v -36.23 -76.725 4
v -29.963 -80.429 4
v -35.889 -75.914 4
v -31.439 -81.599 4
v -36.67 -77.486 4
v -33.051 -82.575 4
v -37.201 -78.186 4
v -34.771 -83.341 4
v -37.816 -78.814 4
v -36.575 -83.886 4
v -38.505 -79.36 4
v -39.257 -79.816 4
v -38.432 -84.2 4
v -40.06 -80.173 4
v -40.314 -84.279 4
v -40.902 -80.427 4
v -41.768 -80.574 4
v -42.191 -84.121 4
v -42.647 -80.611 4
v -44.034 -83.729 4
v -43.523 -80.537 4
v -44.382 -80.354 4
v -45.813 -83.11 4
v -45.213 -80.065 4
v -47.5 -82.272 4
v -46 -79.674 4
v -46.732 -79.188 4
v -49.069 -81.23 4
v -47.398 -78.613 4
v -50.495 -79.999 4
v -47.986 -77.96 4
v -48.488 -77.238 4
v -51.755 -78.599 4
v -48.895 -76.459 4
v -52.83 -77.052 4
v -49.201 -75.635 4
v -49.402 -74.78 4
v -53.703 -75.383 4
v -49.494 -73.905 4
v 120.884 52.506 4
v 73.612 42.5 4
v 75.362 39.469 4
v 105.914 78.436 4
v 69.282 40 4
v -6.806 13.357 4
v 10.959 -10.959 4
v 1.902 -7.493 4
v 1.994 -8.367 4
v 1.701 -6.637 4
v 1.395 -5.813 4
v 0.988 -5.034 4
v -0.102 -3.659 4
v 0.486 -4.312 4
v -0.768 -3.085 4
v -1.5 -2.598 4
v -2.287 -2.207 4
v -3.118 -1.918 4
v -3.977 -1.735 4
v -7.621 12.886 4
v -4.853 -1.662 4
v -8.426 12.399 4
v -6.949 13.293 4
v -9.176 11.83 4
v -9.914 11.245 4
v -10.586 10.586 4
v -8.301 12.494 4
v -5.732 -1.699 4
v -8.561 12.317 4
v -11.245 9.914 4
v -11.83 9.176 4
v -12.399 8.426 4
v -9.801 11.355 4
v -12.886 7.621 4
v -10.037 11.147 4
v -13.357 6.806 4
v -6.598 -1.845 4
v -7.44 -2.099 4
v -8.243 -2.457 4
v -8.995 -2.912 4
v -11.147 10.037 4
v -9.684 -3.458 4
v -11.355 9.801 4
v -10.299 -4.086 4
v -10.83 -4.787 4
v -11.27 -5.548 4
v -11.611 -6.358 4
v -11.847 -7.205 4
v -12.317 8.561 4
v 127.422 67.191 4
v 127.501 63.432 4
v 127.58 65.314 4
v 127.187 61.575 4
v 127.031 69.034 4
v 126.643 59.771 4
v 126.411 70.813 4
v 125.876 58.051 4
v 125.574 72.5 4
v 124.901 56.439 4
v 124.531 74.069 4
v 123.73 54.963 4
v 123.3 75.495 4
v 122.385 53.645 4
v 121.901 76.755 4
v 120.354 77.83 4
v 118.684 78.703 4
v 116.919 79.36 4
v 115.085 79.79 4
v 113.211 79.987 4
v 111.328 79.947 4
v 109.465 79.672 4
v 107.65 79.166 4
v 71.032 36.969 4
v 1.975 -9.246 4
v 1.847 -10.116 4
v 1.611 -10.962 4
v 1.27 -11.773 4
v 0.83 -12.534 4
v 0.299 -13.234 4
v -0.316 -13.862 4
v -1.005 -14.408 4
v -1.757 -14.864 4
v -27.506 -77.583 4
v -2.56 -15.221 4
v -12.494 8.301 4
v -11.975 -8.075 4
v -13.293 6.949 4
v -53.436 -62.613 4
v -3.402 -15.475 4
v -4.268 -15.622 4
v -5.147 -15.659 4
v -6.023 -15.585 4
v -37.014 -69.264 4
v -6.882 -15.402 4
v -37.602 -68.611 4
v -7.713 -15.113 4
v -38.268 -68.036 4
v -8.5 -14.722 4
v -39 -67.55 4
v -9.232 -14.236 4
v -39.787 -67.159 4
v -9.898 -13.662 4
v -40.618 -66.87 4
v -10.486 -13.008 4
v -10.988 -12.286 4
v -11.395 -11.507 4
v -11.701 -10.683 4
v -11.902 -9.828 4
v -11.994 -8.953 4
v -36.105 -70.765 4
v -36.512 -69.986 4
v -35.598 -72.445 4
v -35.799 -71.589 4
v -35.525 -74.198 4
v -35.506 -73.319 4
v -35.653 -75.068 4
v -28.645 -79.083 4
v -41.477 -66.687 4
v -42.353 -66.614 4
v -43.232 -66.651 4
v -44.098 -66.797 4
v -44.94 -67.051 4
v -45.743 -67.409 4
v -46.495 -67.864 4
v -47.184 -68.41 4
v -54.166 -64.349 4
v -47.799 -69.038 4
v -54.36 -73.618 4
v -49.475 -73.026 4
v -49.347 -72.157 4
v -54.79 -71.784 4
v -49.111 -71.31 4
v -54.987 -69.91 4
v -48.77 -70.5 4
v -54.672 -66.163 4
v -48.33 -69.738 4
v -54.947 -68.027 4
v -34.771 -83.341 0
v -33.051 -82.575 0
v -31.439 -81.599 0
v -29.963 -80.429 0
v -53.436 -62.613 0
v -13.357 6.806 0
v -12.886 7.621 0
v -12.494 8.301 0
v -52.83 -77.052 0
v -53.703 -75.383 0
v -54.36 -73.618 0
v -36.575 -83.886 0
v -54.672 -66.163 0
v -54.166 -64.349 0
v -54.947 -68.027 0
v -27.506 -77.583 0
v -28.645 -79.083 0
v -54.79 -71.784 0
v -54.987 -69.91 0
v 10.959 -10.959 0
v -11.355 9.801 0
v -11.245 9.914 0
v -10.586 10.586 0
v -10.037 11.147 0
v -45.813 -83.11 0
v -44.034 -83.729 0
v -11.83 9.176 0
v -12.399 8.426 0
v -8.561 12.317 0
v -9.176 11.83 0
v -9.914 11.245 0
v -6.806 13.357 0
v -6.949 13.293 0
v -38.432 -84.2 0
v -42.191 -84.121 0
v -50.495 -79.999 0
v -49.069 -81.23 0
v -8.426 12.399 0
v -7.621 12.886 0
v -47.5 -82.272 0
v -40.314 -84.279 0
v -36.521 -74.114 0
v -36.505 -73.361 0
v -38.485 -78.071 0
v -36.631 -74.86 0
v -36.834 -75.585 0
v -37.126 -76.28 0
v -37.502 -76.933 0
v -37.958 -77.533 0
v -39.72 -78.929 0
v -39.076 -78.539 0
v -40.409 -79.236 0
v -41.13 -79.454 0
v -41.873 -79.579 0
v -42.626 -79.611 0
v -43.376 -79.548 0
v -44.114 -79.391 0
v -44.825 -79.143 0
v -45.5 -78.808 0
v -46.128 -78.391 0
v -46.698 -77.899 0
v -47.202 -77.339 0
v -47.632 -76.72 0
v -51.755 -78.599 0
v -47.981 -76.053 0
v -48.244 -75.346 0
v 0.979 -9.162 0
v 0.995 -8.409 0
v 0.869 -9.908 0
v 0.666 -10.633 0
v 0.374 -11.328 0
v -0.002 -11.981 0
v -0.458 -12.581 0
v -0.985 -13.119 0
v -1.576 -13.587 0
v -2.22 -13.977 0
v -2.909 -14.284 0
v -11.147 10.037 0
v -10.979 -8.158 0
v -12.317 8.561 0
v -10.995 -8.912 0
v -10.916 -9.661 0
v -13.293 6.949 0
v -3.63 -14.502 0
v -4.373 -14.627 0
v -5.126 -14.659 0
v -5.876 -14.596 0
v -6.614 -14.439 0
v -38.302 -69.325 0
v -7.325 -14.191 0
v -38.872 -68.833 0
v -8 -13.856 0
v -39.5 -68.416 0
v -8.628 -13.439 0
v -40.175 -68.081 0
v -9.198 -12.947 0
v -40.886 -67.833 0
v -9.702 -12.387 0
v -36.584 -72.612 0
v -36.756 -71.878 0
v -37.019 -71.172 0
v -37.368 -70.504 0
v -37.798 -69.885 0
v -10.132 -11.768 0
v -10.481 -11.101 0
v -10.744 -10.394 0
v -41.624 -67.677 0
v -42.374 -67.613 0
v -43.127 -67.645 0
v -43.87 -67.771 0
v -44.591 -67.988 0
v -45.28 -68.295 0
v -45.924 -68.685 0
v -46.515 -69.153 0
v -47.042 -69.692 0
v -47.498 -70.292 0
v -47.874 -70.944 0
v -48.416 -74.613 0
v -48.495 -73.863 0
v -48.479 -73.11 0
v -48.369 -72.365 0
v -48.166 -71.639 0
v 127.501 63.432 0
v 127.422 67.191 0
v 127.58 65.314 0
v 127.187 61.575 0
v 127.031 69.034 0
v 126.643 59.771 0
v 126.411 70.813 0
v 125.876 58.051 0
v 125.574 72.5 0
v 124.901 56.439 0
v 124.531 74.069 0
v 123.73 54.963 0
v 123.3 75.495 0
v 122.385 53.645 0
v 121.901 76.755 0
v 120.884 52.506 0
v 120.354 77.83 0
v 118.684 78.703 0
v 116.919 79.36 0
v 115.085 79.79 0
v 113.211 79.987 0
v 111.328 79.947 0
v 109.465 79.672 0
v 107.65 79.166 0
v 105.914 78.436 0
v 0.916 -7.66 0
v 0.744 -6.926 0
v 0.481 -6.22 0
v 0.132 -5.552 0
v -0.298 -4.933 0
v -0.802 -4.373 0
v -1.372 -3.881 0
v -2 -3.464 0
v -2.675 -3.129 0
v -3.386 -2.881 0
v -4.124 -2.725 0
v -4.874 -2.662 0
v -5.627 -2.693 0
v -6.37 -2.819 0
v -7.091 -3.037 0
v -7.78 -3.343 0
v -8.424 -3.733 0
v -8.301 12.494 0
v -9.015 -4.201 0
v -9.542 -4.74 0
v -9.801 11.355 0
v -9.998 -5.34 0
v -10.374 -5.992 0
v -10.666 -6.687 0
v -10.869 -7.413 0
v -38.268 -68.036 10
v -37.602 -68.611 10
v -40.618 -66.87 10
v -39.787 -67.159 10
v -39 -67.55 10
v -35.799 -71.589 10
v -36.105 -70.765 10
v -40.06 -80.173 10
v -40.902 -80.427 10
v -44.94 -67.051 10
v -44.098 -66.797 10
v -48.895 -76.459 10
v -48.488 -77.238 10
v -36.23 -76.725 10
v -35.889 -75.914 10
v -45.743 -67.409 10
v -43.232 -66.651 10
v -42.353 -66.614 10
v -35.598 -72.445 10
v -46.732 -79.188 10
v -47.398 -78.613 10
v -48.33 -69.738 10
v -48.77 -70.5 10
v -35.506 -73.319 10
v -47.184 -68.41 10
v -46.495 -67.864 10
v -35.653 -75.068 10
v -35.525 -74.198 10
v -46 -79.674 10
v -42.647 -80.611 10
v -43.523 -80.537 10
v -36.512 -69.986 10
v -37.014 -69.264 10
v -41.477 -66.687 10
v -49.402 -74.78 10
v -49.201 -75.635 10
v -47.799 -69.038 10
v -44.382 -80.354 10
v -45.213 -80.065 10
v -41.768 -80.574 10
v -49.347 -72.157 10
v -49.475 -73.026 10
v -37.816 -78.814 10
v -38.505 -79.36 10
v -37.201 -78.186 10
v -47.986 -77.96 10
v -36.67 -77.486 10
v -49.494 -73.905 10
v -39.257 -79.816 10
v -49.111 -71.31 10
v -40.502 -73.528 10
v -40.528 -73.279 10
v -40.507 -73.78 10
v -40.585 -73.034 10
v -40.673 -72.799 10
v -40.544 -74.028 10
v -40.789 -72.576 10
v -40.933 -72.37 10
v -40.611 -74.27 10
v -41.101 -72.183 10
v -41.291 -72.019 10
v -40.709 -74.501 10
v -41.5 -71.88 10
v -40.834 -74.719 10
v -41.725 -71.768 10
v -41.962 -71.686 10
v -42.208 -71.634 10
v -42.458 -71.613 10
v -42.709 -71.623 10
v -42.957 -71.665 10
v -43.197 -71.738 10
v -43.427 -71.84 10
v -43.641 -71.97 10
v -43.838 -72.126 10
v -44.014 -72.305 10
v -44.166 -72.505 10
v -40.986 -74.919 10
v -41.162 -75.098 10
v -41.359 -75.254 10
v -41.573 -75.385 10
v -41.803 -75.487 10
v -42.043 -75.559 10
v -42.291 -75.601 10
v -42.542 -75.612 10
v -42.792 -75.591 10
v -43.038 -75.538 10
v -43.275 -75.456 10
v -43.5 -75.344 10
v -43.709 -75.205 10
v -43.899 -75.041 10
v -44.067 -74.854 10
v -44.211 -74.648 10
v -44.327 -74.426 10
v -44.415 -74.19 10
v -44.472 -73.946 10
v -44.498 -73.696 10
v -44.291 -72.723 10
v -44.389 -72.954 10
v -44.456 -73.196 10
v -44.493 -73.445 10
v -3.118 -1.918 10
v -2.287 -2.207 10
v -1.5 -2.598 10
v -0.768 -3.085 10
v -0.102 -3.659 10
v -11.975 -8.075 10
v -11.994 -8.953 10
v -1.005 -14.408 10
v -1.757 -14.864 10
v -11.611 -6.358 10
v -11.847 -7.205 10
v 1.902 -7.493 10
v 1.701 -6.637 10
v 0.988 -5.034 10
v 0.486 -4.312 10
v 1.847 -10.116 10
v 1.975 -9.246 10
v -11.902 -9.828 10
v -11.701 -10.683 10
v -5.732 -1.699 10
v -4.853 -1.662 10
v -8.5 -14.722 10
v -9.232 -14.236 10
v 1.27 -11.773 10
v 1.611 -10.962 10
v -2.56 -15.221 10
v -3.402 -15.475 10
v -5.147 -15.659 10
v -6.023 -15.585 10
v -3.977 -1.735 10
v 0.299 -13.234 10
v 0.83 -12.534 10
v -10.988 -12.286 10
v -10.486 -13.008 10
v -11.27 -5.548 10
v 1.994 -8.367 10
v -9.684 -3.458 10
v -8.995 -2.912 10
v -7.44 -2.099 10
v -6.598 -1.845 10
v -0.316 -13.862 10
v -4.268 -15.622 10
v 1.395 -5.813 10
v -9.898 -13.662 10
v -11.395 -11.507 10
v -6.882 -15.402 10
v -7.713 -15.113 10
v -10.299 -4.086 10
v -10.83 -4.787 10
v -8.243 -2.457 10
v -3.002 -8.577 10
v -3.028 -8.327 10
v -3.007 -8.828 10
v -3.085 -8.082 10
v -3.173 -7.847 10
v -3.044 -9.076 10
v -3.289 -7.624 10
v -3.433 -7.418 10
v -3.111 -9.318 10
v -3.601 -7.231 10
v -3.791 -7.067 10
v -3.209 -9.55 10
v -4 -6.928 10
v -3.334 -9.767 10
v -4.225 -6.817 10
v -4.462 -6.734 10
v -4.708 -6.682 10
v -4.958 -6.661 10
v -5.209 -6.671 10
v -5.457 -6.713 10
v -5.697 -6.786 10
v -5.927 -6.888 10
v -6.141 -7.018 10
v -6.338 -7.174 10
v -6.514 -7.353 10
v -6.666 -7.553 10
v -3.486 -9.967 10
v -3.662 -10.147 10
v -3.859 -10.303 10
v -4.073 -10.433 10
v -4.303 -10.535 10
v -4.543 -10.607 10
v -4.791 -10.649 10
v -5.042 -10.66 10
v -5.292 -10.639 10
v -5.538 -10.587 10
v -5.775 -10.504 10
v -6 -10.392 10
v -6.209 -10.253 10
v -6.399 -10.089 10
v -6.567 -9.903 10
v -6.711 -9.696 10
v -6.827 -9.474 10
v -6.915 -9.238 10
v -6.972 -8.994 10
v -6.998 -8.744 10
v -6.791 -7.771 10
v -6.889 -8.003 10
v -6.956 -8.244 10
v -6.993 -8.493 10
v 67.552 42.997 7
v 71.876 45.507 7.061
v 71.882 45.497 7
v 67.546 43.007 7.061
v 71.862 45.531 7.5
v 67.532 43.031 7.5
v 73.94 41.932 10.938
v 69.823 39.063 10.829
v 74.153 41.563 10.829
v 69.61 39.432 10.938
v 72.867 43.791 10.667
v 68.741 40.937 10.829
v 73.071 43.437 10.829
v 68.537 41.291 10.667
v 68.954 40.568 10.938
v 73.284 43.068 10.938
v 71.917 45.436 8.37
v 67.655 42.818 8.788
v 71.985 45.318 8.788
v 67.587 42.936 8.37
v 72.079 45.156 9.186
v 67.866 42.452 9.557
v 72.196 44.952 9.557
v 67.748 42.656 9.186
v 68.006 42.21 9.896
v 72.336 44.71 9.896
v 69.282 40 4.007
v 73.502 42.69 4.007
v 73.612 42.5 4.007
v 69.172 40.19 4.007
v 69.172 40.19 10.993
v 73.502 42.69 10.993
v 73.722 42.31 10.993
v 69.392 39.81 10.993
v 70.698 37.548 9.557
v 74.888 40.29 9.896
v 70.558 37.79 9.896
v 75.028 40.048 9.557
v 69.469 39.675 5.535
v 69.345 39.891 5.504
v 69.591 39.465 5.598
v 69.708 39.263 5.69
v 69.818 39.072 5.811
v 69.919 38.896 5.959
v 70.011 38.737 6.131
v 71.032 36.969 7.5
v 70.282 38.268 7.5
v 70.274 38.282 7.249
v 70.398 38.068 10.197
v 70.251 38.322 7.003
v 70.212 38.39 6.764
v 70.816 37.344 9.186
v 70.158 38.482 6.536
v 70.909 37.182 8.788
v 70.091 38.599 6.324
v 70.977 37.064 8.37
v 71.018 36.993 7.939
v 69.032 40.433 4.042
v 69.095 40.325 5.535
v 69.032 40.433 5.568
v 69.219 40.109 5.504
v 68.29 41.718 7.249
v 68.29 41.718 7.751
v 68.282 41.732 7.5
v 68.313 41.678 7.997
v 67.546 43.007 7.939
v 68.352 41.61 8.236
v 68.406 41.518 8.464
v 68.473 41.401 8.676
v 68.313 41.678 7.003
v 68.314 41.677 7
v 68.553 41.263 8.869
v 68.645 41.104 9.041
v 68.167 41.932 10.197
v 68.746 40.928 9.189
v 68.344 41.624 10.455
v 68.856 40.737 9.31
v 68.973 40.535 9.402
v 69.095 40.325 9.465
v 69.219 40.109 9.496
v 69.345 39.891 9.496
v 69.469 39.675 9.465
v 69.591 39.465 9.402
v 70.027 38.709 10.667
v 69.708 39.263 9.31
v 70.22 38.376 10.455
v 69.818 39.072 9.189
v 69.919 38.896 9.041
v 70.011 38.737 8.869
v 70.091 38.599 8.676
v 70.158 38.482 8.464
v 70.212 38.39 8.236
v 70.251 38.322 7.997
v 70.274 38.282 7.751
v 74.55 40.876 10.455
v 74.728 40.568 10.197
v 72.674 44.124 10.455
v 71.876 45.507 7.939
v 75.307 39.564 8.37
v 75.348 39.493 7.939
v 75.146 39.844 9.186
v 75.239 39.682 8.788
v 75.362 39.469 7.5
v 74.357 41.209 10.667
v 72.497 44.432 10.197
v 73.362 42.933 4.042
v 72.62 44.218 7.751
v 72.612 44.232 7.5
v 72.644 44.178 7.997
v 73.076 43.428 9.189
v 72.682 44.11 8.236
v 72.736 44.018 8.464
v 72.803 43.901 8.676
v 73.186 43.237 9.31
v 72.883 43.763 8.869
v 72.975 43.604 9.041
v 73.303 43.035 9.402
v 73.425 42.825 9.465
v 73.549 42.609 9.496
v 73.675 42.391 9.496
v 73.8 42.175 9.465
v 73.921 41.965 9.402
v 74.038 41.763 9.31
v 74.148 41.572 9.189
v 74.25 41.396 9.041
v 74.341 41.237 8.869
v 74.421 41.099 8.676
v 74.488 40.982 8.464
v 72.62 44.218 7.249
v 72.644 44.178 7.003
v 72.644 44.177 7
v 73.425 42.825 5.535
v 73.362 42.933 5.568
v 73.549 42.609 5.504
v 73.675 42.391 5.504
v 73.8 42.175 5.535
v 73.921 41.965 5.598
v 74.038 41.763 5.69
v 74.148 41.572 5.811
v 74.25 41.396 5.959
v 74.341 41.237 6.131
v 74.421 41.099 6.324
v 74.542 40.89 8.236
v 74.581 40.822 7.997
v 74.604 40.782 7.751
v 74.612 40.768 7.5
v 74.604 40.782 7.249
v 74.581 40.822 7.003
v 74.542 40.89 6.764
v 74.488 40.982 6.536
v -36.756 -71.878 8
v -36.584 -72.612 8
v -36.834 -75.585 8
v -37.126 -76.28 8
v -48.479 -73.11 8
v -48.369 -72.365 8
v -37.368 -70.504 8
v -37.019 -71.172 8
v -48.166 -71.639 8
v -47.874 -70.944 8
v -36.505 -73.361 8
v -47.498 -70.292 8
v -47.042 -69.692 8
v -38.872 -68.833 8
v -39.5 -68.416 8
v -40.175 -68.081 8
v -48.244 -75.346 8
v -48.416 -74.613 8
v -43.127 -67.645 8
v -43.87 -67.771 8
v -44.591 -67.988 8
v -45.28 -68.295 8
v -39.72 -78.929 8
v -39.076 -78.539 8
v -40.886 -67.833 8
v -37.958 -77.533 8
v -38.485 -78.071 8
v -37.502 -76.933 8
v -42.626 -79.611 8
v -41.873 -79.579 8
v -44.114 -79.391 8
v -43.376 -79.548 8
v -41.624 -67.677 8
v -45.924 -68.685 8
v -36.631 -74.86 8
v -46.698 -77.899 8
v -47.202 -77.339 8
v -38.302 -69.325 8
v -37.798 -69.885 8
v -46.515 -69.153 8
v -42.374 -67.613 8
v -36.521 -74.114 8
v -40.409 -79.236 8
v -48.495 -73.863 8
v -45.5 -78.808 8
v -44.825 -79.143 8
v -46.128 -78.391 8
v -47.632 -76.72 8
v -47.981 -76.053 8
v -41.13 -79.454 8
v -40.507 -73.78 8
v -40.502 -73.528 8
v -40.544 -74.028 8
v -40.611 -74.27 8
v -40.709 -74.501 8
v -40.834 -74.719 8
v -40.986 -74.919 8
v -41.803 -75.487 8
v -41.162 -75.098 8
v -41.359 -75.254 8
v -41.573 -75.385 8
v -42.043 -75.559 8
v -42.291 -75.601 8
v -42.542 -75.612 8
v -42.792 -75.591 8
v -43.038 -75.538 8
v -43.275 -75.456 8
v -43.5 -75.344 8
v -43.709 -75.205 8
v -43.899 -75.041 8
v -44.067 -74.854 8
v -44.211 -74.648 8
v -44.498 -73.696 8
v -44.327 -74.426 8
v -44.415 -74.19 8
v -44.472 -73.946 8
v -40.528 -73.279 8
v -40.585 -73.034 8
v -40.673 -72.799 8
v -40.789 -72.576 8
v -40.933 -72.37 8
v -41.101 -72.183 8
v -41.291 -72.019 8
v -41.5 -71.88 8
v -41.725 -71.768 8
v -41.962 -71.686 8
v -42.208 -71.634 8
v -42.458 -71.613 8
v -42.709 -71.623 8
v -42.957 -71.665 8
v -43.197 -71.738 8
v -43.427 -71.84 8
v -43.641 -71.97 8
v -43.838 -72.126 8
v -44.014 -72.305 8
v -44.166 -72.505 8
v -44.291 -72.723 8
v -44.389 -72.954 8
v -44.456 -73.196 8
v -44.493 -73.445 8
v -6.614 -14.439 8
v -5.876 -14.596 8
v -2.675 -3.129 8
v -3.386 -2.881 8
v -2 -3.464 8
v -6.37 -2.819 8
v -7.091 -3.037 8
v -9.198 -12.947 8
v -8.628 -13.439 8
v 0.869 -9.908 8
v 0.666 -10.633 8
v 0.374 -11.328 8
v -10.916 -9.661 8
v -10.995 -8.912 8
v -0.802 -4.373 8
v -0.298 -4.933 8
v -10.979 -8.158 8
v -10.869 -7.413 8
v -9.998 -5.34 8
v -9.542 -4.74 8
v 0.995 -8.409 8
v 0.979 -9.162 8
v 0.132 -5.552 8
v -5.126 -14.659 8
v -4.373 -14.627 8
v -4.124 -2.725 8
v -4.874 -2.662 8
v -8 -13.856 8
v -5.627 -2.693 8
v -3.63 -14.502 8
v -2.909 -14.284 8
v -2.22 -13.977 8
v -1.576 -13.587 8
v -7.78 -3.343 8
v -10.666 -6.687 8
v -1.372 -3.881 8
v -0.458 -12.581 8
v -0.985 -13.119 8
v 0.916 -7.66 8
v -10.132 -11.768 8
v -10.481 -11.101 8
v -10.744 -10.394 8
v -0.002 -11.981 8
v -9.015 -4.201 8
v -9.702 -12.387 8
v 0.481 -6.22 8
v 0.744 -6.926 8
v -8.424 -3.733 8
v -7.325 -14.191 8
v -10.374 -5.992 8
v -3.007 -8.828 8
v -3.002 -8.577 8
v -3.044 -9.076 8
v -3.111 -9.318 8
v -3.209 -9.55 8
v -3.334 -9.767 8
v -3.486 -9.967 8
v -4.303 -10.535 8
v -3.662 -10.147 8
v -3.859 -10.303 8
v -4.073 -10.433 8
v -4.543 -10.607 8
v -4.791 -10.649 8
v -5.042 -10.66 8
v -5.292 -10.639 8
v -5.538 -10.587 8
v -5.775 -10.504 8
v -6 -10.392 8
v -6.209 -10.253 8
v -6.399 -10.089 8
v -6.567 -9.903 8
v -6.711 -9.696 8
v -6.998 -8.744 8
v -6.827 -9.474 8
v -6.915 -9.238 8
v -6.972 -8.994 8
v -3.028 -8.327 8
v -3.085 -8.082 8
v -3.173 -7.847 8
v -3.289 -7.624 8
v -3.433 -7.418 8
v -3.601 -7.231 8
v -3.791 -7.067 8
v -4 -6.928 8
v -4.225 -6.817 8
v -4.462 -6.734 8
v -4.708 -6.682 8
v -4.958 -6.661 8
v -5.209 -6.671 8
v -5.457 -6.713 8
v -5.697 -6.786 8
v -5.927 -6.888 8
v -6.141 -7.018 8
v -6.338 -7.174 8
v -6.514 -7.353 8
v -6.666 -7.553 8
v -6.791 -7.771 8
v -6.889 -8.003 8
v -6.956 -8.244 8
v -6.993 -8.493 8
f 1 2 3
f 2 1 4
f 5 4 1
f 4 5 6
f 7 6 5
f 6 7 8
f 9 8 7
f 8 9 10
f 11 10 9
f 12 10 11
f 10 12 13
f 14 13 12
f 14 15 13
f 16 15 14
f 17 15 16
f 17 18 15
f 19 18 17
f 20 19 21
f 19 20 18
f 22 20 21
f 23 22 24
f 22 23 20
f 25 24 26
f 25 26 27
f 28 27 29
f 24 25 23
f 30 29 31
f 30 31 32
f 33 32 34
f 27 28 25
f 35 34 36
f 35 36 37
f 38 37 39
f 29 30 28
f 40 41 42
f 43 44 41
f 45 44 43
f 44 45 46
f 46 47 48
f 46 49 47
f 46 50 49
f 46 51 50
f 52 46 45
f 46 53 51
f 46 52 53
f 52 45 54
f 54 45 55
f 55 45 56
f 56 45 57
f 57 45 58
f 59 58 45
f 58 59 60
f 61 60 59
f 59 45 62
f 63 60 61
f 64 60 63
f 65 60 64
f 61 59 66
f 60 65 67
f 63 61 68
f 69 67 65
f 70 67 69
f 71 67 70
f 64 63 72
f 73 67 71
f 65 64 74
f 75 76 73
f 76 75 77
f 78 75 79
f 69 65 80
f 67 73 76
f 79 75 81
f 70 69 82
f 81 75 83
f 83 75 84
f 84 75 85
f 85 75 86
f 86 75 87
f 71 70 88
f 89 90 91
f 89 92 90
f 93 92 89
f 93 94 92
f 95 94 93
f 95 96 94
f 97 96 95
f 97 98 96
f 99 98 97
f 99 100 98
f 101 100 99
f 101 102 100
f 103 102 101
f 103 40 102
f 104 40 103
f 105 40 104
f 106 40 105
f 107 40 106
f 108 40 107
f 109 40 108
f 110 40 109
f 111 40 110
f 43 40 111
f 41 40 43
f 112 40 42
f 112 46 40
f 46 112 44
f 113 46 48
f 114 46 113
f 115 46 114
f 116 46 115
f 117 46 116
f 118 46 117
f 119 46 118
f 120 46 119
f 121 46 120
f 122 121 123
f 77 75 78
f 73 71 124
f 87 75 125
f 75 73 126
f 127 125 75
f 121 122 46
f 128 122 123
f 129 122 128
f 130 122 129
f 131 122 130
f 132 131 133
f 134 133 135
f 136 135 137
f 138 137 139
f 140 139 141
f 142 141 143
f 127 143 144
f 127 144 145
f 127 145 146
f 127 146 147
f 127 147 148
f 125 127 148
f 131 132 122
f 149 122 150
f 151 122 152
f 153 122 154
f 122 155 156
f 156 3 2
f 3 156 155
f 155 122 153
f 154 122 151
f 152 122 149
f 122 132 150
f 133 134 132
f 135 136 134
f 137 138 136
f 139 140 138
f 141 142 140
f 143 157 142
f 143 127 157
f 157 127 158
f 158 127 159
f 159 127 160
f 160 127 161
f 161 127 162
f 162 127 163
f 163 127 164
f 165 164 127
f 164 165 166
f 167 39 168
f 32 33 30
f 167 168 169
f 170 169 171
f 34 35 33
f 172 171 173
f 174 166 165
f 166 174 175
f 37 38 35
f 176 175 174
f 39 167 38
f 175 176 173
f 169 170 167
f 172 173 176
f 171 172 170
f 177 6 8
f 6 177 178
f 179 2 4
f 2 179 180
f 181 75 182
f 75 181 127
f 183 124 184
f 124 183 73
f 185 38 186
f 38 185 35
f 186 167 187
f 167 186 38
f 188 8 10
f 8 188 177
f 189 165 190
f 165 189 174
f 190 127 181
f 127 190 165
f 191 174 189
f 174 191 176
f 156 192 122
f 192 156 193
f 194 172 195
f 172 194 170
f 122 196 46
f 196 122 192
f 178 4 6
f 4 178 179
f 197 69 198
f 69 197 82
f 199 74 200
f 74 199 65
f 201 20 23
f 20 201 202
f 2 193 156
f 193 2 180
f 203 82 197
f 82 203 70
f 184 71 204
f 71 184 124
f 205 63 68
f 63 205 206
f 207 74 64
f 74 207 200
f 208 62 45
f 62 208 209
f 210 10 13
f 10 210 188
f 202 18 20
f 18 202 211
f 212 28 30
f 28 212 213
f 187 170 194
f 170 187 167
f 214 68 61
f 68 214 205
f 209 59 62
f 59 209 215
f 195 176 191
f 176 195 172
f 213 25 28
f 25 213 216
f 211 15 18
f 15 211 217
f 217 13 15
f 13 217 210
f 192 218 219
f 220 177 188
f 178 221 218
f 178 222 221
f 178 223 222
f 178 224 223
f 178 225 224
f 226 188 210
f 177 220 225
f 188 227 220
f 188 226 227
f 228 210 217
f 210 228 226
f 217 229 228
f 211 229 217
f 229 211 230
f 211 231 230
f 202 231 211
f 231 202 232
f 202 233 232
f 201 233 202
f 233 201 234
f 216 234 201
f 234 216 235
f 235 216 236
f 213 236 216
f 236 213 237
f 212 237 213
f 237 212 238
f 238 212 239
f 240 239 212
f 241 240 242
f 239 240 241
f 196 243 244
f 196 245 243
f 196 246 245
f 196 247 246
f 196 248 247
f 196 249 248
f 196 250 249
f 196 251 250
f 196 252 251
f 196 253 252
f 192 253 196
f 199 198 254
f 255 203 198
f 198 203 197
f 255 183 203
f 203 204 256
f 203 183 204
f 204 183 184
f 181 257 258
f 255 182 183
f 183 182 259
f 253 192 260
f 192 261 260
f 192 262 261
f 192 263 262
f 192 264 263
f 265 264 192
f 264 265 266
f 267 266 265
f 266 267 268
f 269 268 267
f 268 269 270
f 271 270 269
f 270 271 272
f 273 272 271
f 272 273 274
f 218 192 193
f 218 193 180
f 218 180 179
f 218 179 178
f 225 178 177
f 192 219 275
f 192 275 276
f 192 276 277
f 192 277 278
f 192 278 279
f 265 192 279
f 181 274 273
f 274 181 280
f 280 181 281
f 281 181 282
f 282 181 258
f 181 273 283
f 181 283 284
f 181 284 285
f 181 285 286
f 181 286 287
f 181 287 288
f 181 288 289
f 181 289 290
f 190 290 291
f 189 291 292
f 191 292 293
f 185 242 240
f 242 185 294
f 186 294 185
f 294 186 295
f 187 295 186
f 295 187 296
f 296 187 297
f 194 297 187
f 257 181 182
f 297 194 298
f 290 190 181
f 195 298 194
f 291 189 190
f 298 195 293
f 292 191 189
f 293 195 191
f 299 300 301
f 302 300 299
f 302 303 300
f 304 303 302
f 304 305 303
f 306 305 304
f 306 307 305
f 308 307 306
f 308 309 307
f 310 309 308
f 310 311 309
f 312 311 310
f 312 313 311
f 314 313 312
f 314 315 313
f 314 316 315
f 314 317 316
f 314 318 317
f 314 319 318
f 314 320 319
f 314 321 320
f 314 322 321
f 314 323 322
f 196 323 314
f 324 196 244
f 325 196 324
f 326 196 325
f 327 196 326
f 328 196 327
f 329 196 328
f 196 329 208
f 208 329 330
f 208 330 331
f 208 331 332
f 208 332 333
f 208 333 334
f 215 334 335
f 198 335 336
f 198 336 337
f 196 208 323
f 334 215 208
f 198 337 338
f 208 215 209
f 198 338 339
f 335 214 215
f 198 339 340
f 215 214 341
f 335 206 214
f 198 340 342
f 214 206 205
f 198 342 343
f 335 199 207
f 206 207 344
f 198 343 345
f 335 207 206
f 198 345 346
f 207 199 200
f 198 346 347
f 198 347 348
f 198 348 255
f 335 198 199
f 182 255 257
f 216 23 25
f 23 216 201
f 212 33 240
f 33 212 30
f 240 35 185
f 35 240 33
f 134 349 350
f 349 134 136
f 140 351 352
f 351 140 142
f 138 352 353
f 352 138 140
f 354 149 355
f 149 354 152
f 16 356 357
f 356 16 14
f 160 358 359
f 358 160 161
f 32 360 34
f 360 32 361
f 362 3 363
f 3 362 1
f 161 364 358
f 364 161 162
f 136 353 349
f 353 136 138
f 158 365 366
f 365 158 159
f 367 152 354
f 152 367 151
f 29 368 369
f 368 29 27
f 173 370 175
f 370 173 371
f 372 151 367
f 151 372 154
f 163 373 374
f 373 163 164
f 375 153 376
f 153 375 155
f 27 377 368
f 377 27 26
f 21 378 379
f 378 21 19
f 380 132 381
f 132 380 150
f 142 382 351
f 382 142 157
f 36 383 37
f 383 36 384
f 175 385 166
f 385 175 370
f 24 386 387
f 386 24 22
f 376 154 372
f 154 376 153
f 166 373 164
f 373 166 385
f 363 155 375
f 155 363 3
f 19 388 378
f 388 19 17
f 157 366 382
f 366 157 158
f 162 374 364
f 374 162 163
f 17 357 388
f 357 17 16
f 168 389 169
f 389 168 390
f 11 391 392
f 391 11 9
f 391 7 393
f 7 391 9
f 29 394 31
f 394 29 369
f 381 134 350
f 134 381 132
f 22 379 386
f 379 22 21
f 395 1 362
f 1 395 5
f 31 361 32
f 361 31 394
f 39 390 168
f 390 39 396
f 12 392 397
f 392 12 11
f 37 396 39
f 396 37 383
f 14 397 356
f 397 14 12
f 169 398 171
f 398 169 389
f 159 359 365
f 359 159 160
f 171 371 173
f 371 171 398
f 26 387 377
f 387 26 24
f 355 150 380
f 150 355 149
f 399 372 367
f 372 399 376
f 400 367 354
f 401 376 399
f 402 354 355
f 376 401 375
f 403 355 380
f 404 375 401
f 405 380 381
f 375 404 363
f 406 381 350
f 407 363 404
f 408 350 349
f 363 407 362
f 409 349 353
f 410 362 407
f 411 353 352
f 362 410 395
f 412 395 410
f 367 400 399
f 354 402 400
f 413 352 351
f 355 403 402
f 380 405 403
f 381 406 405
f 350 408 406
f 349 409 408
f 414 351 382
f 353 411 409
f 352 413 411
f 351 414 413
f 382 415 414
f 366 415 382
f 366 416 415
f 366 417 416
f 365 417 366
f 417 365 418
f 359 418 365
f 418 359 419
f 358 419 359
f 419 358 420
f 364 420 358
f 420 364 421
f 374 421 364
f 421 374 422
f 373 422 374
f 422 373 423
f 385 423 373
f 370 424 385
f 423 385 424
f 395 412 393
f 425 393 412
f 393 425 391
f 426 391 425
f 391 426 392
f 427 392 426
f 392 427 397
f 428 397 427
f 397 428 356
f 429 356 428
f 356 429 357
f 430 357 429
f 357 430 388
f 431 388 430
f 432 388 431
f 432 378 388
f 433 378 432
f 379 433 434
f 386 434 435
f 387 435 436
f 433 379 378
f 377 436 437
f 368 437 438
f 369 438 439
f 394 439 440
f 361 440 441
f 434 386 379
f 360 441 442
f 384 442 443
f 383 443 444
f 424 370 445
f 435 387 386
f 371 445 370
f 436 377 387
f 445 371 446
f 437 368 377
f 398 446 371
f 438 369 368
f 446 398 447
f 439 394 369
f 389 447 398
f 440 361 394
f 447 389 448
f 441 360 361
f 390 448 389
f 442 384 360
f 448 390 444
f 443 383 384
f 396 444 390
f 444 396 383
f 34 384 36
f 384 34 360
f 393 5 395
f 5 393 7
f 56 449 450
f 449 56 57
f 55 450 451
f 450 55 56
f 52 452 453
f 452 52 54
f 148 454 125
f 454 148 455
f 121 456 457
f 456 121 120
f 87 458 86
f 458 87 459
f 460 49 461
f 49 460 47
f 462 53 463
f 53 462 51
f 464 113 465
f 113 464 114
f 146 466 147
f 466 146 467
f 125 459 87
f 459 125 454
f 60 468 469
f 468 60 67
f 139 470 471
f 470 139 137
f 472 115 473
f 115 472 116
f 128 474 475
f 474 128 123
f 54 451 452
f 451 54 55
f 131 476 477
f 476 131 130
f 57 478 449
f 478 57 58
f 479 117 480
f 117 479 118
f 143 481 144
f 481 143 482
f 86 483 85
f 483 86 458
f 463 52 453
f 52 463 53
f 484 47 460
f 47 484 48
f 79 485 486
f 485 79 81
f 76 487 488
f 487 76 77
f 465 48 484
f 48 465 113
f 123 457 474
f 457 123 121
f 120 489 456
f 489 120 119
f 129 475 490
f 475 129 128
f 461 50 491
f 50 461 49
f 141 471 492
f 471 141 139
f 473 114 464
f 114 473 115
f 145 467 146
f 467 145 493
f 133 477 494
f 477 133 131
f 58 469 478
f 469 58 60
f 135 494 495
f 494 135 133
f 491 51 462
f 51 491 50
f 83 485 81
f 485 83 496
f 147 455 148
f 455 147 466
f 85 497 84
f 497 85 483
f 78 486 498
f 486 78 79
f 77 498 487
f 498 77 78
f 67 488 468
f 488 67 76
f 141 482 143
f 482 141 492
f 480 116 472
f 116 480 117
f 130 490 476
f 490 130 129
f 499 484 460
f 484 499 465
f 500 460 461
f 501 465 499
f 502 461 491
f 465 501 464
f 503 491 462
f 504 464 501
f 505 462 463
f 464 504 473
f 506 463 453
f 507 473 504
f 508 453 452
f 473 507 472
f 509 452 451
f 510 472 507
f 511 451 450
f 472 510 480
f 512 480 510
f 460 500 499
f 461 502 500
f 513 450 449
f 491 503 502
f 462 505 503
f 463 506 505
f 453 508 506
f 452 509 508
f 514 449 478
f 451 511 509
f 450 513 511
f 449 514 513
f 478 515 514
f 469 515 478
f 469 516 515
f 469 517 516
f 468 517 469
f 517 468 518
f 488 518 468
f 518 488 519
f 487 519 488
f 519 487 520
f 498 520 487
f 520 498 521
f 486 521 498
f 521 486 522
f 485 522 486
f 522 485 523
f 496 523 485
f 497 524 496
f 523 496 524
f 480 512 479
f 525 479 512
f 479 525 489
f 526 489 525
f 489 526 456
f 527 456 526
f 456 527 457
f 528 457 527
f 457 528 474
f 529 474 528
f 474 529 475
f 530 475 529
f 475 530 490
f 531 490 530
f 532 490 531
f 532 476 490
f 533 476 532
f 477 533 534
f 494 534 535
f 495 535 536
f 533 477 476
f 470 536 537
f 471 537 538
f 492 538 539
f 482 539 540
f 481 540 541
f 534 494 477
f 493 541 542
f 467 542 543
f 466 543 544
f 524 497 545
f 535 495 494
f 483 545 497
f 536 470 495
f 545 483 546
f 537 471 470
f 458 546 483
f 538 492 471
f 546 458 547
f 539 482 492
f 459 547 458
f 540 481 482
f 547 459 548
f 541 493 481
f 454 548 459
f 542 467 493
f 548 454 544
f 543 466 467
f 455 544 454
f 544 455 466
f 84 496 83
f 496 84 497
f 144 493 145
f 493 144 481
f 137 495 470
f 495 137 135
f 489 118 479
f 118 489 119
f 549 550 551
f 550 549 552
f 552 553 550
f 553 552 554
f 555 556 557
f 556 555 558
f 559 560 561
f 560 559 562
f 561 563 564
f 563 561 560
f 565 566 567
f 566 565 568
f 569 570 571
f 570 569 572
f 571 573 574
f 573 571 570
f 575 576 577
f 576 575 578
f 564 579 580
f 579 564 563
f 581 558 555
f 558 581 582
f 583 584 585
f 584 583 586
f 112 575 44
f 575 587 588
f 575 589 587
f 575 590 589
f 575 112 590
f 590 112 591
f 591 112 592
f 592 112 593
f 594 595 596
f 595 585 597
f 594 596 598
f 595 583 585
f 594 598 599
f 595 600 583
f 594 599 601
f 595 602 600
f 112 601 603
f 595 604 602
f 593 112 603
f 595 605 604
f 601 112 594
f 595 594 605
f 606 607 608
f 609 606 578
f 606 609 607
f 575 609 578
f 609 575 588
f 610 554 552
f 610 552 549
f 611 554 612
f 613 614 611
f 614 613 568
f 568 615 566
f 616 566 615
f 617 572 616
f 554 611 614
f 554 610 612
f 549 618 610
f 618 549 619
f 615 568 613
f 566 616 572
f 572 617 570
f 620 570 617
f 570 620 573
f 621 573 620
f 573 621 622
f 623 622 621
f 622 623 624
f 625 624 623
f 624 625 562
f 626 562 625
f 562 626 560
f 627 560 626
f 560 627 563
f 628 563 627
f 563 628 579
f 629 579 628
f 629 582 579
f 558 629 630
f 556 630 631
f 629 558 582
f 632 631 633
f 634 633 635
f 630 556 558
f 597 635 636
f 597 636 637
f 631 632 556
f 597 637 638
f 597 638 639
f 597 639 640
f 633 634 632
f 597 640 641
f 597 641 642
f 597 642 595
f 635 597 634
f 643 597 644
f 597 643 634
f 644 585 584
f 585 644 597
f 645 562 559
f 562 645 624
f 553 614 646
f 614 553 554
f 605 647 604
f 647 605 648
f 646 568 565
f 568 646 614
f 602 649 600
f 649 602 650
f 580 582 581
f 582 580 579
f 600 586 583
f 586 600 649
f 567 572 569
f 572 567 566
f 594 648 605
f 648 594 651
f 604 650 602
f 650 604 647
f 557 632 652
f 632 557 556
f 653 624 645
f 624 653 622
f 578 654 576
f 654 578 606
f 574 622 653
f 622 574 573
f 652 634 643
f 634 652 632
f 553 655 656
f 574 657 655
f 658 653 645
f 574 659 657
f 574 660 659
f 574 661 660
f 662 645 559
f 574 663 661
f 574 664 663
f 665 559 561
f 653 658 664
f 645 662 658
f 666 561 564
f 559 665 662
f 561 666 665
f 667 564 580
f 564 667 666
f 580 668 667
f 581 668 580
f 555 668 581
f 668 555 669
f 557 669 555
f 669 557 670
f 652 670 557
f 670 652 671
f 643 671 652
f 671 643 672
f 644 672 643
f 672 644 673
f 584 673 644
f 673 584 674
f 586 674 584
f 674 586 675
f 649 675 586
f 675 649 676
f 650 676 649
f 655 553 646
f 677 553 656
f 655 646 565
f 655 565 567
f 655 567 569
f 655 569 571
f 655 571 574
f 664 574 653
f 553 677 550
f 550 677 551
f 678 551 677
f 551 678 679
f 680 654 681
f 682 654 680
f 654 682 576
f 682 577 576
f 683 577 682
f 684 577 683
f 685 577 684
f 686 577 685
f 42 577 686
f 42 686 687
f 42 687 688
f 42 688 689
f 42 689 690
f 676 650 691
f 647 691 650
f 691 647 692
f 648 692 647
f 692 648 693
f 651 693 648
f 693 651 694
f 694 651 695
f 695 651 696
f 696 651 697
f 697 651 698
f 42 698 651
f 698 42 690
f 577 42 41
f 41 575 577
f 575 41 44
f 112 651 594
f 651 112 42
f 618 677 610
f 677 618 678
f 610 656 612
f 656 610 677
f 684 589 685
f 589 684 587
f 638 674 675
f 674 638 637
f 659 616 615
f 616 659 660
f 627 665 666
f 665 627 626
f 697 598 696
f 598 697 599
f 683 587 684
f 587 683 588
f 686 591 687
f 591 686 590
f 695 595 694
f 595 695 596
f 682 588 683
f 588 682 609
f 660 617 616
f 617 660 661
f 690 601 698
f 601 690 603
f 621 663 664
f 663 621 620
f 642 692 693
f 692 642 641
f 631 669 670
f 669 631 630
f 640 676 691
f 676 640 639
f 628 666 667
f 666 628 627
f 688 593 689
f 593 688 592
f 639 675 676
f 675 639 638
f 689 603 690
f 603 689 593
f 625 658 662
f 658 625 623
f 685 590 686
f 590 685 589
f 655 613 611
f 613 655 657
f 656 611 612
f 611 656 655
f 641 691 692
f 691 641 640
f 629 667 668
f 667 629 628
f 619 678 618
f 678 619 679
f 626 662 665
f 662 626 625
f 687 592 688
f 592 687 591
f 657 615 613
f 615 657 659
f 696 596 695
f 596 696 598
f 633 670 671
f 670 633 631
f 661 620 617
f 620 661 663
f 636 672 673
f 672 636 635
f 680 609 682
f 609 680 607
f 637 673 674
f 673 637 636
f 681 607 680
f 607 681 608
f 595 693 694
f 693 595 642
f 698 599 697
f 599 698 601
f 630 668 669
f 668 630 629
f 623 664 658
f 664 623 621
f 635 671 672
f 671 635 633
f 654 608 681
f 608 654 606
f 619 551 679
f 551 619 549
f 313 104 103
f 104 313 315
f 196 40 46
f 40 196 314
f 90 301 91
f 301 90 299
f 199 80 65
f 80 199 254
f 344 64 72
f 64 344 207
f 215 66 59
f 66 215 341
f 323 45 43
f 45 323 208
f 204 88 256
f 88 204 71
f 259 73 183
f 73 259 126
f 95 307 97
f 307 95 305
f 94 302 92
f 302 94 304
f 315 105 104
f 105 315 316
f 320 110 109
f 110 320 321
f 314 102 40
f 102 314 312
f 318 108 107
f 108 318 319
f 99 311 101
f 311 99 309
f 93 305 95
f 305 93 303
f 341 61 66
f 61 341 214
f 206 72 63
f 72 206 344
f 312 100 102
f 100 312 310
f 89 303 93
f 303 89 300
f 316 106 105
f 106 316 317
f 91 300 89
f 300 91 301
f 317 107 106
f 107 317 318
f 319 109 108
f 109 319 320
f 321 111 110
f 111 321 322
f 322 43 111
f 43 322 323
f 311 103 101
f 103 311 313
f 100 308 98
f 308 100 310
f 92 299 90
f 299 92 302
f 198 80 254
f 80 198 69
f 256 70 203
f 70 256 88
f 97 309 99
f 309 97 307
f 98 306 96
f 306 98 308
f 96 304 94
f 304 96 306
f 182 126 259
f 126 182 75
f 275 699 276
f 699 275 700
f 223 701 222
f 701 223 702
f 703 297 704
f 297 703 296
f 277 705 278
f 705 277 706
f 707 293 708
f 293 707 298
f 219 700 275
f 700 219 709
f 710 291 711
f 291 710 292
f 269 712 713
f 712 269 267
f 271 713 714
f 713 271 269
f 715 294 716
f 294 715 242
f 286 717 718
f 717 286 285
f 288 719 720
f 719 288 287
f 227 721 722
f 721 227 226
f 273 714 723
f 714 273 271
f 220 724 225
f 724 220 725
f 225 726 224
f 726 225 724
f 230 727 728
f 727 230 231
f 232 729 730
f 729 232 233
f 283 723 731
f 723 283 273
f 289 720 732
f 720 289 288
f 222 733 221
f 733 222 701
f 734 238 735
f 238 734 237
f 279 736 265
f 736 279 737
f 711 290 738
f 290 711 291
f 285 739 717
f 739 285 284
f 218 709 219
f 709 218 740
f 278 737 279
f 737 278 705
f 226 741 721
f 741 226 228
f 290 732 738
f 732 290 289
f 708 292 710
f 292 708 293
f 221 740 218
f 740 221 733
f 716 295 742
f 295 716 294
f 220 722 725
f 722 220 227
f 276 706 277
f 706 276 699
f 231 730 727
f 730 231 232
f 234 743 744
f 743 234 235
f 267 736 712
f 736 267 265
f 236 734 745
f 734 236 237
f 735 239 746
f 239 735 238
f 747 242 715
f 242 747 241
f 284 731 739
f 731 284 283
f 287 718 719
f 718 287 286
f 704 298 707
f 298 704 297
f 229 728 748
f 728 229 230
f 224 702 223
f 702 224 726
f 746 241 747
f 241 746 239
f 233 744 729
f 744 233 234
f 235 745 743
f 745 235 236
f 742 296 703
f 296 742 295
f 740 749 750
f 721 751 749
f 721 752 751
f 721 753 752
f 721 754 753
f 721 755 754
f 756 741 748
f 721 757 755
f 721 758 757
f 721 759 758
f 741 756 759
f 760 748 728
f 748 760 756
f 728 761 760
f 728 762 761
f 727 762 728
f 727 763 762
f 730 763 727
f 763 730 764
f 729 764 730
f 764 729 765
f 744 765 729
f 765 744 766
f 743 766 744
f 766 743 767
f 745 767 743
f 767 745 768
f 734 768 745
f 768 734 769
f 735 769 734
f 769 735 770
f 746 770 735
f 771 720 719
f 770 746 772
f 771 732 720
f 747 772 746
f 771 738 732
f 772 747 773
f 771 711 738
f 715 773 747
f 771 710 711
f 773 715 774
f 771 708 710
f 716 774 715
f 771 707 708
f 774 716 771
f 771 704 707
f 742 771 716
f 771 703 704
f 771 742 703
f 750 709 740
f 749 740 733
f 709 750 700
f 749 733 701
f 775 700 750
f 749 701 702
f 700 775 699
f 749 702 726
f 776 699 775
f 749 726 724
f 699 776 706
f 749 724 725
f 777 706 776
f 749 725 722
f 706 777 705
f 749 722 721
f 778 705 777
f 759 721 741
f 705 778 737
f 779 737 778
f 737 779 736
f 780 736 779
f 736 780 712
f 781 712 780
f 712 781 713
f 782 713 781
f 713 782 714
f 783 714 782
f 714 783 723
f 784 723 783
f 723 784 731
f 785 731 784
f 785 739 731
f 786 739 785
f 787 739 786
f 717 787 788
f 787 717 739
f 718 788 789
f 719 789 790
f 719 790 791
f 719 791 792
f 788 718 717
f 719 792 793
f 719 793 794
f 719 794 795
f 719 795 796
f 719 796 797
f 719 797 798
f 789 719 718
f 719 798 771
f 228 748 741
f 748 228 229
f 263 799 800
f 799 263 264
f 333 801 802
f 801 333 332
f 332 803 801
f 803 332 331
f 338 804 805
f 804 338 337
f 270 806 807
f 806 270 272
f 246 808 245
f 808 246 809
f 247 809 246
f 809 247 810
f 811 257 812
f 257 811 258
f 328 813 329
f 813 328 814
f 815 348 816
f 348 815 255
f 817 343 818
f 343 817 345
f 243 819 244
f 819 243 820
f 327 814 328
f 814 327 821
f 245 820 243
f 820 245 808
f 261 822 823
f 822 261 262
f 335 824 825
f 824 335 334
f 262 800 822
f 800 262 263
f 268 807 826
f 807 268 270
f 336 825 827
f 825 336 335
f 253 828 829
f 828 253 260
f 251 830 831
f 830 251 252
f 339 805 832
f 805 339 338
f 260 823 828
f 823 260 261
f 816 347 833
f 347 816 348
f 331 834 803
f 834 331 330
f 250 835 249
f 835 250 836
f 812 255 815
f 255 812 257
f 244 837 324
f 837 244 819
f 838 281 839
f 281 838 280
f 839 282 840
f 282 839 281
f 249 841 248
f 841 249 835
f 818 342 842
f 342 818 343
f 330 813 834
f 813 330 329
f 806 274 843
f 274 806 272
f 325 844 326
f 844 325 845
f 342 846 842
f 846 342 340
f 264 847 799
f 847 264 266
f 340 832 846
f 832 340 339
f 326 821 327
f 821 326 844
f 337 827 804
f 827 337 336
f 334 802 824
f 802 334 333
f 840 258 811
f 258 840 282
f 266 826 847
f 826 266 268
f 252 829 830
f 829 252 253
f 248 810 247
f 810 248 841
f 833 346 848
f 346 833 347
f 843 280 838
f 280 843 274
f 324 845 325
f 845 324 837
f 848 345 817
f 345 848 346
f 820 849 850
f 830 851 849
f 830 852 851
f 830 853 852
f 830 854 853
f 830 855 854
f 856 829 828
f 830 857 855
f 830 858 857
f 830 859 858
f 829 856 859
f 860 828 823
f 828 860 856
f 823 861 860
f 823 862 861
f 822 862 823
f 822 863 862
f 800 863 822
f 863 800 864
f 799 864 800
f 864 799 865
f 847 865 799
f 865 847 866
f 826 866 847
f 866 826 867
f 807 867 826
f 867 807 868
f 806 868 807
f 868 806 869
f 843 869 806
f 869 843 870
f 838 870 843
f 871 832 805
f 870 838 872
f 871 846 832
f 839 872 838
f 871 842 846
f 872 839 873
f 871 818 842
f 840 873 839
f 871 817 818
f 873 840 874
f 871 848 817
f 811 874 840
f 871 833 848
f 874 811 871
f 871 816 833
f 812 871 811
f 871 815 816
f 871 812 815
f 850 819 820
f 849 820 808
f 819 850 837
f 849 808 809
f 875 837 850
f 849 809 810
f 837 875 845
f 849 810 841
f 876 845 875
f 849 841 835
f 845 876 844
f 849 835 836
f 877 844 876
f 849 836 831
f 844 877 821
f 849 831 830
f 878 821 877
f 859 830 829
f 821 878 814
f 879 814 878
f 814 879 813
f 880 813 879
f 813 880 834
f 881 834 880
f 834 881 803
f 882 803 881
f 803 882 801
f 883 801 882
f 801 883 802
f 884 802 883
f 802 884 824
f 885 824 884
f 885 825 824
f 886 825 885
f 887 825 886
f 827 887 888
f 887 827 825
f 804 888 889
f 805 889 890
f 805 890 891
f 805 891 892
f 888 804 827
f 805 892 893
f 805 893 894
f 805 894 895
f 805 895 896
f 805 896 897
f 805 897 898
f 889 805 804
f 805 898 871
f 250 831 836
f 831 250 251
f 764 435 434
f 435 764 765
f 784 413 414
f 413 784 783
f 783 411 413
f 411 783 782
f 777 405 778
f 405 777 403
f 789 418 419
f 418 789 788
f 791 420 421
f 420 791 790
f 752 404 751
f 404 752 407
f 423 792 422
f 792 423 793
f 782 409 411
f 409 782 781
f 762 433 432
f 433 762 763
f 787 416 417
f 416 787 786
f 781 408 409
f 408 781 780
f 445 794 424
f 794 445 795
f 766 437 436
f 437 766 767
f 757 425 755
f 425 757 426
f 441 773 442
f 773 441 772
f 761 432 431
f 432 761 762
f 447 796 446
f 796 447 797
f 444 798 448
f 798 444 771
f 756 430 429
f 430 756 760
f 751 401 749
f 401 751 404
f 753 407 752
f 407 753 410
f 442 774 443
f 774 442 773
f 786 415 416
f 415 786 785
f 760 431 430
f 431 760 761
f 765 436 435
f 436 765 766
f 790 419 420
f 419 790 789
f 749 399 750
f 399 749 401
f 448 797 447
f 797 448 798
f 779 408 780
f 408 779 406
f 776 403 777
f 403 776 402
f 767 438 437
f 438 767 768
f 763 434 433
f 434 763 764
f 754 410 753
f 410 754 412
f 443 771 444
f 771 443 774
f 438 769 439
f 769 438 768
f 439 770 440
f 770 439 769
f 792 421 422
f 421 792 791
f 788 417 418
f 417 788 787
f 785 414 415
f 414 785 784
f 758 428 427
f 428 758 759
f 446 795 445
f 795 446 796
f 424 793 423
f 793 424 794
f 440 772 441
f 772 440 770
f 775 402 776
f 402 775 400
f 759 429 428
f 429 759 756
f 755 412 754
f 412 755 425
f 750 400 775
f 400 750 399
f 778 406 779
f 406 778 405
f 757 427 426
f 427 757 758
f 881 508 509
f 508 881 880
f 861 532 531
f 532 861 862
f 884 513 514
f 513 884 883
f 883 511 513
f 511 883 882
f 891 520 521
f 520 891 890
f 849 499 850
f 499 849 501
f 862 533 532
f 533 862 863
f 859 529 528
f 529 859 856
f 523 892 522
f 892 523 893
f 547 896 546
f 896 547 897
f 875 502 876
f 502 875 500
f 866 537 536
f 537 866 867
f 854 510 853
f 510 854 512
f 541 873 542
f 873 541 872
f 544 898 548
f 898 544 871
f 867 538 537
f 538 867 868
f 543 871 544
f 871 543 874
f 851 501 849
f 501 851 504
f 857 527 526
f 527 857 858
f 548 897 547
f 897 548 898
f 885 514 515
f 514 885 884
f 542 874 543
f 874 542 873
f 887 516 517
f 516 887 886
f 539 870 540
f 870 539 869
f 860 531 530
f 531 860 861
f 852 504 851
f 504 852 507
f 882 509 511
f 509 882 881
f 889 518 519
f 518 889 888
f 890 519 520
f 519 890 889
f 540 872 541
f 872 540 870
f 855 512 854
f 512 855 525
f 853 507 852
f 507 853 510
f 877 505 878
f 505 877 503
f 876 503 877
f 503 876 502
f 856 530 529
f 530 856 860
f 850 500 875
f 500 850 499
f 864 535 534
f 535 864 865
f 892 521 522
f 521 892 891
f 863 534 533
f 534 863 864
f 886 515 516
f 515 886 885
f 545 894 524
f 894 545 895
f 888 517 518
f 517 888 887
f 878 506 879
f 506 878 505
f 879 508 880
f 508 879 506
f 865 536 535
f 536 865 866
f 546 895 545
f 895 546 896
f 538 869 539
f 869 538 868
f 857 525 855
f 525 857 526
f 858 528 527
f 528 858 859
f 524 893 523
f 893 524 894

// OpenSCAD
/* [Support] */
// Length of the mount arm. Longer arms will produce more vibrations.
armLenght = 145; // [120:170]

// Mount direction
mountDir = 1; // [1:To the right, -1:To the left]
// Angle between arms. Best suit for me was 30º
armsAngle = 30; // [0:90]

// Include cable holder
cableHolder = 1; // [0:No, 1:Yes]

// Cable diameter
cableDiameter = 4; // [1:10]

// Separation between cable holder and mount support
holderSeparation = 60; //[10:150]

/* [Hidden] */
width=30;
height=4;
corner=10;
len1=armLenght;
len2=95;


rad1=6;
rad2=7;
rad3=2;
h1=6;
h2=2;

// Separation between drills
dist1=75;

// Distance to end from mount base
dist2=10;
dist3=holderSeparation;
$fn=50;

ang=armsAngle*mountDir;

cR=1.5;
cabRad=cableDiameter/2;
cabLen=5;



rotate(a=[0, 0, (mountDir == 1 ? 0 : 180) + mountDir*30]) carMount();

module carMount() {
difference() {
union() {
sideA();
//translate([len1-dist2, 0, height]) mount();
rotate(a=[0, 0, ang]) translate([-len2+width/2, 0, 0]) sideB();
    if (cableHolder==1) translate([len1-dist3, 0, height]) cableHolder();
}
rotate(a=[0, 0, ang]) translate([-len2+width/2, 0, 0]) drills();
}
}

module cableHolder() {
    translate([0, 0, cabRad+cR]) rotate(a=[90, -180, -mountDir*90])
    difference() {
        union() {
    cylinder(r=cabRad+cR, h=cabLen);
    translate([-cabRad-cR, 0, 0]) cube([cabRad+cR, cabRad+cR, cabLen]);
        }
    translate([0, 0, -1]){ cylinder(r=cabRad, h=cabLen+2);
    translate([0.5, 0.5, 0]) cube([cabRad+cR, cabRad+cR, cabLen+2]);}}
}

module sideA() {
hull() {
    cylinder(r=width/2, h=height);
    translate([len1-width/2, 0, 0]) cylinder(r=width/2, h=height);
}    
}

module sideB() {
    hull() {
    cylinder(r=width/2, h=height);
    translate([(len2-width/2), 0, 0]) cylinder(r=width/2, h=height);
    }
    translate([-(width/2-10), 0, height]) cylinder(r=rad2, h=h1);
    translate([-(width/2-10)+dist1, 0, height]) cylinder(r=rad2, h=h1);
}

module drills() {
    translate([-(width/2-10), 0, -1]) cylinder(r=rad1, h=height+h1-h2+1);
    translate([-(width/2-10)+dist1, 0, -1]) cylinder(r=rad1, h=height+h1-h2+1);
    translate([-(width/2-10), 0, 0]) cylinder(r=rad3, h=height+h1+1);
    translate([-(width/2-10)+dist1, 0, 0]) cylinder(r=rad3, h=height+h1+1);
}
